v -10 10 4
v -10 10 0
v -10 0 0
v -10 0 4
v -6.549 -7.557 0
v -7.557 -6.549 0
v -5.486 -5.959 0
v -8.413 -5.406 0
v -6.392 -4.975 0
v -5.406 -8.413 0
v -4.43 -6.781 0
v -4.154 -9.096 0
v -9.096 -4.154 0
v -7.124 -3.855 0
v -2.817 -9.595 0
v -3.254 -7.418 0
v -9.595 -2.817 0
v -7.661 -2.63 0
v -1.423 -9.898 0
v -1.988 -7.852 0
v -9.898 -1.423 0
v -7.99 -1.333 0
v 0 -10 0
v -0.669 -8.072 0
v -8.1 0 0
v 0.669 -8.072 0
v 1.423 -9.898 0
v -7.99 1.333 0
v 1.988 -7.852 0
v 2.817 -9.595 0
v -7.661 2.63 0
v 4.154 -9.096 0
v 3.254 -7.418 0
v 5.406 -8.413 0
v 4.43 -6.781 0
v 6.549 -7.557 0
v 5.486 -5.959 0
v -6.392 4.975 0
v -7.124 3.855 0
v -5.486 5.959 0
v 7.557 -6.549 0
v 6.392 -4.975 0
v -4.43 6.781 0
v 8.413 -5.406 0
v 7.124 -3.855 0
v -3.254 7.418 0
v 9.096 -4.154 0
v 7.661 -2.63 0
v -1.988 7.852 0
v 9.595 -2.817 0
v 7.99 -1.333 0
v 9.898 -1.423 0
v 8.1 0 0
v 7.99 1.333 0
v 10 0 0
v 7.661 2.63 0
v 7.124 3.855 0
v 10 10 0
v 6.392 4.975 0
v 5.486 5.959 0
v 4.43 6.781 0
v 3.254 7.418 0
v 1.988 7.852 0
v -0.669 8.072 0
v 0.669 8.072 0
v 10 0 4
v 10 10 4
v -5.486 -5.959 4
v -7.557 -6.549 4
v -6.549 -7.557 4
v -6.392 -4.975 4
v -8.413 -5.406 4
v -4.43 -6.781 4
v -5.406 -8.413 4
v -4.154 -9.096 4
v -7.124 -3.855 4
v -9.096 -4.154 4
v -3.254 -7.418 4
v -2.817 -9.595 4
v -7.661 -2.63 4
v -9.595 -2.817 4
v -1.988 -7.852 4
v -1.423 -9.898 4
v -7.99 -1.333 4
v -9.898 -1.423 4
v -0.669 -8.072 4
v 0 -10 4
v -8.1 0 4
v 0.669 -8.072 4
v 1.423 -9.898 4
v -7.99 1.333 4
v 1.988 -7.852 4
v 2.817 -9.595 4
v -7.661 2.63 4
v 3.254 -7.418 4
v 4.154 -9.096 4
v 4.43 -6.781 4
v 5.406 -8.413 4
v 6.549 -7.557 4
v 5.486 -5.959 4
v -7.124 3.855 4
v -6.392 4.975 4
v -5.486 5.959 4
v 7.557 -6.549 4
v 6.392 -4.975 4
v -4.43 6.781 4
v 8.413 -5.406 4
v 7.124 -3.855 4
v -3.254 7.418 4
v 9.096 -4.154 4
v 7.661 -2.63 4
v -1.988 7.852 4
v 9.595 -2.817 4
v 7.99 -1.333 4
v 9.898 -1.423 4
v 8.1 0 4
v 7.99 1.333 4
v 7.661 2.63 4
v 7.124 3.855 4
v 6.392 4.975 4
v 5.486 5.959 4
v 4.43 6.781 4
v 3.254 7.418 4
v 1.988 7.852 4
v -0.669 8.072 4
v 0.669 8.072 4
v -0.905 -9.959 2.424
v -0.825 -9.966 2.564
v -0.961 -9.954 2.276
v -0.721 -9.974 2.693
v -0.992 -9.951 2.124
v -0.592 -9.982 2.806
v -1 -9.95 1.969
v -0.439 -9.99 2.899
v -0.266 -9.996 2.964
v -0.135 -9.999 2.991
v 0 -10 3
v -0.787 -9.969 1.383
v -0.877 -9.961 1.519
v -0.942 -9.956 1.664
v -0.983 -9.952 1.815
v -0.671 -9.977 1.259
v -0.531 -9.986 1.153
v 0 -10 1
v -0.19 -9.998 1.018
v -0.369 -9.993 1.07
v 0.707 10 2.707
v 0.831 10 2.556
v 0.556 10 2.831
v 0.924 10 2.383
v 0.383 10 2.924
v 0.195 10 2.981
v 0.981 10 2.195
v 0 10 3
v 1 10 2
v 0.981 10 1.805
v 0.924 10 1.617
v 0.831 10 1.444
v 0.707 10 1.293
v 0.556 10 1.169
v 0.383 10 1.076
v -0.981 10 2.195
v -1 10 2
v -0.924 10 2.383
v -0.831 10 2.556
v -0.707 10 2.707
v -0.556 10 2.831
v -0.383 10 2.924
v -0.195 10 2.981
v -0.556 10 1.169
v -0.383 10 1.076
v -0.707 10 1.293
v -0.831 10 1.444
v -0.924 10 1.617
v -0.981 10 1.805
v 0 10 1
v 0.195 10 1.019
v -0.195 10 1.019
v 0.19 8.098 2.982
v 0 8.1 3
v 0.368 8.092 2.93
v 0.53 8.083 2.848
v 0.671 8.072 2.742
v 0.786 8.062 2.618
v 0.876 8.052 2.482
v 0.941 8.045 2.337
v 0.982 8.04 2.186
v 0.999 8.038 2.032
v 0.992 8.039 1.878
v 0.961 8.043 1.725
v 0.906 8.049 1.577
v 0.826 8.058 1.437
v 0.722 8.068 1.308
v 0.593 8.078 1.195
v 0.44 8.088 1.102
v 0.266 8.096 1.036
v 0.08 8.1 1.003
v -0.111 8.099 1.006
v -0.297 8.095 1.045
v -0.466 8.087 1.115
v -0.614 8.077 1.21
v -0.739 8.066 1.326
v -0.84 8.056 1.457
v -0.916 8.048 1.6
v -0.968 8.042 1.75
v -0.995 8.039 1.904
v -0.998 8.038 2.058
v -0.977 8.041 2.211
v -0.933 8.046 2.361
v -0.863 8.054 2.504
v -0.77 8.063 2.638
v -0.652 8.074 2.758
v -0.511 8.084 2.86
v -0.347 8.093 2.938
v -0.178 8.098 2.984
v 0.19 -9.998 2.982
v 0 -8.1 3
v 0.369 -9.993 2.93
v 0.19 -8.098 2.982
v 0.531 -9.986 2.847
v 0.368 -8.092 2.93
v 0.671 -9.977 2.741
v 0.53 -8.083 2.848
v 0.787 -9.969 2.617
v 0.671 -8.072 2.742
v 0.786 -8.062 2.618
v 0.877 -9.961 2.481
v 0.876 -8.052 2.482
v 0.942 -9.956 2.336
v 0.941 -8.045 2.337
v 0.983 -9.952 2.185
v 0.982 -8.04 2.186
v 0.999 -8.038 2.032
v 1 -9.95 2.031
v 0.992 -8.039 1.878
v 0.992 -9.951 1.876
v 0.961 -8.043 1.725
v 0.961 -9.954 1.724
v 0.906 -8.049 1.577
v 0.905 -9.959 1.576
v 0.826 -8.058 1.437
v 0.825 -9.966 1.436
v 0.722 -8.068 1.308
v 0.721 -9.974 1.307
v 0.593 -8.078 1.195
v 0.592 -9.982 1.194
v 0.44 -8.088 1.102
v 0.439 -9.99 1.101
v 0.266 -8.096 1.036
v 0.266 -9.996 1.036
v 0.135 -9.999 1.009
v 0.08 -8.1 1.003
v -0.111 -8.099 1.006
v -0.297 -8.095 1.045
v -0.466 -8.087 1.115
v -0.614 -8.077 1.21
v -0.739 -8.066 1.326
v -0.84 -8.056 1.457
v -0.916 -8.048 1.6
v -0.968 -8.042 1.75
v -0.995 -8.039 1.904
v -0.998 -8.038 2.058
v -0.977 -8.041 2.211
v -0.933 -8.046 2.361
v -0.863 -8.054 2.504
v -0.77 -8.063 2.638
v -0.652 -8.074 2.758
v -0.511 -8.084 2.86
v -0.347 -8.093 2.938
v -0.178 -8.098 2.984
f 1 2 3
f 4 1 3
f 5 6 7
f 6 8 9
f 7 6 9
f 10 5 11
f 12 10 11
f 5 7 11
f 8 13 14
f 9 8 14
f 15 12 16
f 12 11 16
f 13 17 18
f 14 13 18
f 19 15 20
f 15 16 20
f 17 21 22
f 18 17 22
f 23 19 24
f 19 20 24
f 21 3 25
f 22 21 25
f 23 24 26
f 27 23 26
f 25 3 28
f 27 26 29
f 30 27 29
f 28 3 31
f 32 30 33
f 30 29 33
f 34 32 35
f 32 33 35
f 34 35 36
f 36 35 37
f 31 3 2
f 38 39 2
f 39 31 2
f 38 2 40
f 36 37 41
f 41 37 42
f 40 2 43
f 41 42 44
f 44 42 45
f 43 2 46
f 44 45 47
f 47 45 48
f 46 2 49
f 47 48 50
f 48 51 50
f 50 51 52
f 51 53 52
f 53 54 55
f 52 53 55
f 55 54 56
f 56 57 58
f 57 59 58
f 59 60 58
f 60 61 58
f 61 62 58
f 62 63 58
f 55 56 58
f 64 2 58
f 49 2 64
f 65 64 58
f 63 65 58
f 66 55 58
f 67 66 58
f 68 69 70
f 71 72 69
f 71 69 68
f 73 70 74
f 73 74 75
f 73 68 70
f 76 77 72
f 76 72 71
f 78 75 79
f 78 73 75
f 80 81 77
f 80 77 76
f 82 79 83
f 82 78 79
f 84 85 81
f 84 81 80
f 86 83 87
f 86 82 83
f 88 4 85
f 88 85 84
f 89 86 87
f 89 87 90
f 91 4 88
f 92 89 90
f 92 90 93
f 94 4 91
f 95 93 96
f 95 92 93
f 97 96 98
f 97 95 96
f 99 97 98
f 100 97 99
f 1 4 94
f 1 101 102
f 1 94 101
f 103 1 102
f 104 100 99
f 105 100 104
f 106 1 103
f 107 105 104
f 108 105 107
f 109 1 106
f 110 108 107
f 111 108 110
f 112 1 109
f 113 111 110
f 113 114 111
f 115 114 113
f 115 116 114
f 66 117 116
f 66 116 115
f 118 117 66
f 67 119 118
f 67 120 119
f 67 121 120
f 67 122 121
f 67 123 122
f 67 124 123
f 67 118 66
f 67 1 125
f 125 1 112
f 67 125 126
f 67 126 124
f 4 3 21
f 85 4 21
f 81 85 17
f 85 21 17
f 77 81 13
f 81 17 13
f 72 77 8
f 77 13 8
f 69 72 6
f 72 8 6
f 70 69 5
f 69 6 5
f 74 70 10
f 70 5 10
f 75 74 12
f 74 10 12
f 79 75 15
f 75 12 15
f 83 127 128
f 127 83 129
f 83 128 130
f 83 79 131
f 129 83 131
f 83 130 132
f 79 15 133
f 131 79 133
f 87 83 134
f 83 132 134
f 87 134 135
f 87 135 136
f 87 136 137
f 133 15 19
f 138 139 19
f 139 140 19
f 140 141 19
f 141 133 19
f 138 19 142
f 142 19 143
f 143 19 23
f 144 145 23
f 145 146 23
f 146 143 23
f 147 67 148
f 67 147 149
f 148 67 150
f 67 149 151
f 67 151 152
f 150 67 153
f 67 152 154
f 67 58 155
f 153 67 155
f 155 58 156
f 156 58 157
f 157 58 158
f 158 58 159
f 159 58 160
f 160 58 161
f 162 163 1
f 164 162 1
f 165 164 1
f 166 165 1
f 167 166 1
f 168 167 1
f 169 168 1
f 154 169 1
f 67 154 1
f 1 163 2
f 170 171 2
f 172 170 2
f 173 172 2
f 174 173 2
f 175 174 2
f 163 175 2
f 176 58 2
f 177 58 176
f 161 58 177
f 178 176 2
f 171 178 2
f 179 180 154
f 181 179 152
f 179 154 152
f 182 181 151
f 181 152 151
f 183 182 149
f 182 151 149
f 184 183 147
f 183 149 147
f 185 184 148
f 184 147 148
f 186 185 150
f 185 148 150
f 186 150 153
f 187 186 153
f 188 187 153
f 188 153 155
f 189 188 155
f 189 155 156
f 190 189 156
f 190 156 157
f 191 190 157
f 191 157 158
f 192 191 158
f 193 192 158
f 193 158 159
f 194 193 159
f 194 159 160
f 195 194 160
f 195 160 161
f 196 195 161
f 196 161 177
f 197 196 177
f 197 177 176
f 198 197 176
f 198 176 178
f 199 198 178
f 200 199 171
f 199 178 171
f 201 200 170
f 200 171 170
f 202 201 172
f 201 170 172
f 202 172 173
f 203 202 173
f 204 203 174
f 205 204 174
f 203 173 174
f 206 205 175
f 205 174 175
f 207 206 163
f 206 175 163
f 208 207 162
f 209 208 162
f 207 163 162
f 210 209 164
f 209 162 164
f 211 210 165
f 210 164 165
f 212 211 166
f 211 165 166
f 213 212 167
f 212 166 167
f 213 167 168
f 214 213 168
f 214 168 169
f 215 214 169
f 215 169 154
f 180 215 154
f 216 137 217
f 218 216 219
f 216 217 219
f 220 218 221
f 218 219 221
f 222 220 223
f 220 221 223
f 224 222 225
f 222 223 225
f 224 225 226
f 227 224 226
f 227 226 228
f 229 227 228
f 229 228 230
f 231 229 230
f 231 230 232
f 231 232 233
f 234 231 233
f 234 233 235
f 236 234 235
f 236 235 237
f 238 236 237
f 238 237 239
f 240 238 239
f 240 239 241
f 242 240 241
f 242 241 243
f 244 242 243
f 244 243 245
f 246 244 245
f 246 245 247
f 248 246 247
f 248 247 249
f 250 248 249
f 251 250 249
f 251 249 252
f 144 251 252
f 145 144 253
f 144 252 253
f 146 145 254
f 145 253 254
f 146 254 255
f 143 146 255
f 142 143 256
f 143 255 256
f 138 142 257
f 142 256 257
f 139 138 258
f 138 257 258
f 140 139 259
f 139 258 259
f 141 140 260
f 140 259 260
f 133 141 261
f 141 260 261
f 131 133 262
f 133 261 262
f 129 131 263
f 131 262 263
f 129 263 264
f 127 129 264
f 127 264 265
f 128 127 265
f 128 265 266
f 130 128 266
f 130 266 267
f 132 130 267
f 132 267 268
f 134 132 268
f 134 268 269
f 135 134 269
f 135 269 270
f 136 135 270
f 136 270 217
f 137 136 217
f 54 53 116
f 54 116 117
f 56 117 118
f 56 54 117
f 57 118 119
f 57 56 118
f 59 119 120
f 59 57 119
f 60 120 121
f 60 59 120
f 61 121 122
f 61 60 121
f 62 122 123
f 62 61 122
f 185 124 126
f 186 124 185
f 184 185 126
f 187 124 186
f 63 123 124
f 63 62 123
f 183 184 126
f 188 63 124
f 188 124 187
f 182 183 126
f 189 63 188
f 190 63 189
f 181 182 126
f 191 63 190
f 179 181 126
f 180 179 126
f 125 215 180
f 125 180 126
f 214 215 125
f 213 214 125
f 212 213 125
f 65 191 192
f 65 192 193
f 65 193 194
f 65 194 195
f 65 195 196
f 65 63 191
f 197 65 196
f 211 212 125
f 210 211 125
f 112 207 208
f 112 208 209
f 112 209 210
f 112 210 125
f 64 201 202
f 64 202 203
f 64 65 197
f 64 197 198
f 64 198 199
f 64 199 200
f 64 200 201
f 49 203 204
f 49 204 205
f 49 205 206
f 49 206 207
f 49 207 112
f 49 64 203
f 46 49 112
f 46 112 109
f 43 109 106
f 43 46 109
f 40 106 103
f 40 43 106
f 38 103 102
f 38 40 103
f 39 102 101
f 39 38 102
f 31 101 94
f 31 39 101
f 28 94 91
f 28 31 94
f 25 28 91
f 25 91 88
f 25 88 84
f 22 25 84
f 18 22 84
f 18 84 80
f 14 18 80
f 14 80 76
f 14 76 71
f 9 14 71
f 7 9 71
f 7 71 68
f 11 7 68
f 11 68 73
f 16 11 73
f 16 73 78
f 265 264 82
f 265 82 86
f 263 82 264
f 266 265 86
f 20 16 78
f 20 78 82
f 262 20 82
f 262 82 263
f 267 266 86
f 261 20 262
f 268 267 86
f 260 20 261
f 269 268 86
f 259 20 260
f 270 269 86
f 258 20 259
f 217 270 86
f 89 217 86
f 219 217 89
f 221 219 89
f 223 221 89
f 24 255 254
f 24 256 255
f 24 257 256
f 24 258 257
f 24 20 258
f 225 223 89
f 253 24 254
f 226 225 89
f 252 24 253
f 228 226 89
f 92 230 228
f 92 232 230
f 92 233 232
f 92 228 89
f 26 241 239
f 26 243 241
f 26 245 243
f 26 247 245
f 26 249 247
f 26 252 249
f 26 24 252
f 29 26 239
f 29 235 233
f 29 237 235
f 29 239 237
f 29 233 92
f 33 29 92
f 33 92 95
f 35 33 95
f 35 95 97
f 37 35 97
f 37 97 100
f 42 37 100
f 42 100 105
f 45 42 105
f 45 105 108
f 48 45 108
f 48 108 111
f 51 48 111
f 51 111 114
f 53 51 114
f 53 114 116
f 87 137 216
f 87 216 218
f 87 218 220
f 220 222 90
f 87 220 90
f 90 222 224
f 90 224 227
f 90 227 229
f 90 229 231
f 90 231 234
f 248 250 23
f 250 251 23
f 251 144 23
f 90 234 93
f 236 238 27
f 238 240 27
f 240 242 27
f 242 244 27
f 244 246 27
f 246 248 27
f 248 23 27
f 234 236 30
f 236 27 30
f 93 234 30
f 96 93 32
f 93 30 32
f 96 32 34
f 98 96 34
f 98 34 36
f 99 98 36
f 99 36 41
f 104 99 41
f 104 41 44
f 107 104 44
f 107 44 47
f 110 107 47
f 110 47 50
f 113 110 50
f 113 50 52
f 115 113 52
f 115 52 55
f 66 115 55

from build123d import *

# Parameters (mm, degrees)
SKETCH1_R           = 8.1
BOSS_EXTRUDE1_DEPTH = 4
SKETCH3_R           = 1
CUT_EXTRUDE1_DEPTH  = 20


with BuildPart() as part:
    # Sketch1 → Boss-Extrude1 (new body)
    with BuildSketch(Plane.XY):
        with BuildLine():
            ThreePointArc((-10, 0), (-7.071067812, -7.071067812), (0, -10))
            ThreePointArc((0, -10), (7.071067812, -7.071067812), (10, 0))
            Line((10, 0), (10, 10))
            Line((10, 10), (-10, 10))
            Line((-10, 10), (-10, 0))
        make_face()
        Circle(SKETCH1_R, mode=Mode.SUBTRACT)
    extrude(amount=BOSS_EXTRUDE1_DEPTH)

    # Sketch3 → Cut-Extrude1 (cut)
    with BuildSketch(Plane(origin=(0, 10, 0), x_dir=(1, 0, 0), z_dir=(0, 1, 0))):
        with Locations(Location((0, -2, 0), (0, 0, 270))):
            Circle(SKETCH3_R)
    extrude(amount=-CUT_EXTRUDE1_DEPTH, mode=Mode.SUBTRACT)


solid = part.part
